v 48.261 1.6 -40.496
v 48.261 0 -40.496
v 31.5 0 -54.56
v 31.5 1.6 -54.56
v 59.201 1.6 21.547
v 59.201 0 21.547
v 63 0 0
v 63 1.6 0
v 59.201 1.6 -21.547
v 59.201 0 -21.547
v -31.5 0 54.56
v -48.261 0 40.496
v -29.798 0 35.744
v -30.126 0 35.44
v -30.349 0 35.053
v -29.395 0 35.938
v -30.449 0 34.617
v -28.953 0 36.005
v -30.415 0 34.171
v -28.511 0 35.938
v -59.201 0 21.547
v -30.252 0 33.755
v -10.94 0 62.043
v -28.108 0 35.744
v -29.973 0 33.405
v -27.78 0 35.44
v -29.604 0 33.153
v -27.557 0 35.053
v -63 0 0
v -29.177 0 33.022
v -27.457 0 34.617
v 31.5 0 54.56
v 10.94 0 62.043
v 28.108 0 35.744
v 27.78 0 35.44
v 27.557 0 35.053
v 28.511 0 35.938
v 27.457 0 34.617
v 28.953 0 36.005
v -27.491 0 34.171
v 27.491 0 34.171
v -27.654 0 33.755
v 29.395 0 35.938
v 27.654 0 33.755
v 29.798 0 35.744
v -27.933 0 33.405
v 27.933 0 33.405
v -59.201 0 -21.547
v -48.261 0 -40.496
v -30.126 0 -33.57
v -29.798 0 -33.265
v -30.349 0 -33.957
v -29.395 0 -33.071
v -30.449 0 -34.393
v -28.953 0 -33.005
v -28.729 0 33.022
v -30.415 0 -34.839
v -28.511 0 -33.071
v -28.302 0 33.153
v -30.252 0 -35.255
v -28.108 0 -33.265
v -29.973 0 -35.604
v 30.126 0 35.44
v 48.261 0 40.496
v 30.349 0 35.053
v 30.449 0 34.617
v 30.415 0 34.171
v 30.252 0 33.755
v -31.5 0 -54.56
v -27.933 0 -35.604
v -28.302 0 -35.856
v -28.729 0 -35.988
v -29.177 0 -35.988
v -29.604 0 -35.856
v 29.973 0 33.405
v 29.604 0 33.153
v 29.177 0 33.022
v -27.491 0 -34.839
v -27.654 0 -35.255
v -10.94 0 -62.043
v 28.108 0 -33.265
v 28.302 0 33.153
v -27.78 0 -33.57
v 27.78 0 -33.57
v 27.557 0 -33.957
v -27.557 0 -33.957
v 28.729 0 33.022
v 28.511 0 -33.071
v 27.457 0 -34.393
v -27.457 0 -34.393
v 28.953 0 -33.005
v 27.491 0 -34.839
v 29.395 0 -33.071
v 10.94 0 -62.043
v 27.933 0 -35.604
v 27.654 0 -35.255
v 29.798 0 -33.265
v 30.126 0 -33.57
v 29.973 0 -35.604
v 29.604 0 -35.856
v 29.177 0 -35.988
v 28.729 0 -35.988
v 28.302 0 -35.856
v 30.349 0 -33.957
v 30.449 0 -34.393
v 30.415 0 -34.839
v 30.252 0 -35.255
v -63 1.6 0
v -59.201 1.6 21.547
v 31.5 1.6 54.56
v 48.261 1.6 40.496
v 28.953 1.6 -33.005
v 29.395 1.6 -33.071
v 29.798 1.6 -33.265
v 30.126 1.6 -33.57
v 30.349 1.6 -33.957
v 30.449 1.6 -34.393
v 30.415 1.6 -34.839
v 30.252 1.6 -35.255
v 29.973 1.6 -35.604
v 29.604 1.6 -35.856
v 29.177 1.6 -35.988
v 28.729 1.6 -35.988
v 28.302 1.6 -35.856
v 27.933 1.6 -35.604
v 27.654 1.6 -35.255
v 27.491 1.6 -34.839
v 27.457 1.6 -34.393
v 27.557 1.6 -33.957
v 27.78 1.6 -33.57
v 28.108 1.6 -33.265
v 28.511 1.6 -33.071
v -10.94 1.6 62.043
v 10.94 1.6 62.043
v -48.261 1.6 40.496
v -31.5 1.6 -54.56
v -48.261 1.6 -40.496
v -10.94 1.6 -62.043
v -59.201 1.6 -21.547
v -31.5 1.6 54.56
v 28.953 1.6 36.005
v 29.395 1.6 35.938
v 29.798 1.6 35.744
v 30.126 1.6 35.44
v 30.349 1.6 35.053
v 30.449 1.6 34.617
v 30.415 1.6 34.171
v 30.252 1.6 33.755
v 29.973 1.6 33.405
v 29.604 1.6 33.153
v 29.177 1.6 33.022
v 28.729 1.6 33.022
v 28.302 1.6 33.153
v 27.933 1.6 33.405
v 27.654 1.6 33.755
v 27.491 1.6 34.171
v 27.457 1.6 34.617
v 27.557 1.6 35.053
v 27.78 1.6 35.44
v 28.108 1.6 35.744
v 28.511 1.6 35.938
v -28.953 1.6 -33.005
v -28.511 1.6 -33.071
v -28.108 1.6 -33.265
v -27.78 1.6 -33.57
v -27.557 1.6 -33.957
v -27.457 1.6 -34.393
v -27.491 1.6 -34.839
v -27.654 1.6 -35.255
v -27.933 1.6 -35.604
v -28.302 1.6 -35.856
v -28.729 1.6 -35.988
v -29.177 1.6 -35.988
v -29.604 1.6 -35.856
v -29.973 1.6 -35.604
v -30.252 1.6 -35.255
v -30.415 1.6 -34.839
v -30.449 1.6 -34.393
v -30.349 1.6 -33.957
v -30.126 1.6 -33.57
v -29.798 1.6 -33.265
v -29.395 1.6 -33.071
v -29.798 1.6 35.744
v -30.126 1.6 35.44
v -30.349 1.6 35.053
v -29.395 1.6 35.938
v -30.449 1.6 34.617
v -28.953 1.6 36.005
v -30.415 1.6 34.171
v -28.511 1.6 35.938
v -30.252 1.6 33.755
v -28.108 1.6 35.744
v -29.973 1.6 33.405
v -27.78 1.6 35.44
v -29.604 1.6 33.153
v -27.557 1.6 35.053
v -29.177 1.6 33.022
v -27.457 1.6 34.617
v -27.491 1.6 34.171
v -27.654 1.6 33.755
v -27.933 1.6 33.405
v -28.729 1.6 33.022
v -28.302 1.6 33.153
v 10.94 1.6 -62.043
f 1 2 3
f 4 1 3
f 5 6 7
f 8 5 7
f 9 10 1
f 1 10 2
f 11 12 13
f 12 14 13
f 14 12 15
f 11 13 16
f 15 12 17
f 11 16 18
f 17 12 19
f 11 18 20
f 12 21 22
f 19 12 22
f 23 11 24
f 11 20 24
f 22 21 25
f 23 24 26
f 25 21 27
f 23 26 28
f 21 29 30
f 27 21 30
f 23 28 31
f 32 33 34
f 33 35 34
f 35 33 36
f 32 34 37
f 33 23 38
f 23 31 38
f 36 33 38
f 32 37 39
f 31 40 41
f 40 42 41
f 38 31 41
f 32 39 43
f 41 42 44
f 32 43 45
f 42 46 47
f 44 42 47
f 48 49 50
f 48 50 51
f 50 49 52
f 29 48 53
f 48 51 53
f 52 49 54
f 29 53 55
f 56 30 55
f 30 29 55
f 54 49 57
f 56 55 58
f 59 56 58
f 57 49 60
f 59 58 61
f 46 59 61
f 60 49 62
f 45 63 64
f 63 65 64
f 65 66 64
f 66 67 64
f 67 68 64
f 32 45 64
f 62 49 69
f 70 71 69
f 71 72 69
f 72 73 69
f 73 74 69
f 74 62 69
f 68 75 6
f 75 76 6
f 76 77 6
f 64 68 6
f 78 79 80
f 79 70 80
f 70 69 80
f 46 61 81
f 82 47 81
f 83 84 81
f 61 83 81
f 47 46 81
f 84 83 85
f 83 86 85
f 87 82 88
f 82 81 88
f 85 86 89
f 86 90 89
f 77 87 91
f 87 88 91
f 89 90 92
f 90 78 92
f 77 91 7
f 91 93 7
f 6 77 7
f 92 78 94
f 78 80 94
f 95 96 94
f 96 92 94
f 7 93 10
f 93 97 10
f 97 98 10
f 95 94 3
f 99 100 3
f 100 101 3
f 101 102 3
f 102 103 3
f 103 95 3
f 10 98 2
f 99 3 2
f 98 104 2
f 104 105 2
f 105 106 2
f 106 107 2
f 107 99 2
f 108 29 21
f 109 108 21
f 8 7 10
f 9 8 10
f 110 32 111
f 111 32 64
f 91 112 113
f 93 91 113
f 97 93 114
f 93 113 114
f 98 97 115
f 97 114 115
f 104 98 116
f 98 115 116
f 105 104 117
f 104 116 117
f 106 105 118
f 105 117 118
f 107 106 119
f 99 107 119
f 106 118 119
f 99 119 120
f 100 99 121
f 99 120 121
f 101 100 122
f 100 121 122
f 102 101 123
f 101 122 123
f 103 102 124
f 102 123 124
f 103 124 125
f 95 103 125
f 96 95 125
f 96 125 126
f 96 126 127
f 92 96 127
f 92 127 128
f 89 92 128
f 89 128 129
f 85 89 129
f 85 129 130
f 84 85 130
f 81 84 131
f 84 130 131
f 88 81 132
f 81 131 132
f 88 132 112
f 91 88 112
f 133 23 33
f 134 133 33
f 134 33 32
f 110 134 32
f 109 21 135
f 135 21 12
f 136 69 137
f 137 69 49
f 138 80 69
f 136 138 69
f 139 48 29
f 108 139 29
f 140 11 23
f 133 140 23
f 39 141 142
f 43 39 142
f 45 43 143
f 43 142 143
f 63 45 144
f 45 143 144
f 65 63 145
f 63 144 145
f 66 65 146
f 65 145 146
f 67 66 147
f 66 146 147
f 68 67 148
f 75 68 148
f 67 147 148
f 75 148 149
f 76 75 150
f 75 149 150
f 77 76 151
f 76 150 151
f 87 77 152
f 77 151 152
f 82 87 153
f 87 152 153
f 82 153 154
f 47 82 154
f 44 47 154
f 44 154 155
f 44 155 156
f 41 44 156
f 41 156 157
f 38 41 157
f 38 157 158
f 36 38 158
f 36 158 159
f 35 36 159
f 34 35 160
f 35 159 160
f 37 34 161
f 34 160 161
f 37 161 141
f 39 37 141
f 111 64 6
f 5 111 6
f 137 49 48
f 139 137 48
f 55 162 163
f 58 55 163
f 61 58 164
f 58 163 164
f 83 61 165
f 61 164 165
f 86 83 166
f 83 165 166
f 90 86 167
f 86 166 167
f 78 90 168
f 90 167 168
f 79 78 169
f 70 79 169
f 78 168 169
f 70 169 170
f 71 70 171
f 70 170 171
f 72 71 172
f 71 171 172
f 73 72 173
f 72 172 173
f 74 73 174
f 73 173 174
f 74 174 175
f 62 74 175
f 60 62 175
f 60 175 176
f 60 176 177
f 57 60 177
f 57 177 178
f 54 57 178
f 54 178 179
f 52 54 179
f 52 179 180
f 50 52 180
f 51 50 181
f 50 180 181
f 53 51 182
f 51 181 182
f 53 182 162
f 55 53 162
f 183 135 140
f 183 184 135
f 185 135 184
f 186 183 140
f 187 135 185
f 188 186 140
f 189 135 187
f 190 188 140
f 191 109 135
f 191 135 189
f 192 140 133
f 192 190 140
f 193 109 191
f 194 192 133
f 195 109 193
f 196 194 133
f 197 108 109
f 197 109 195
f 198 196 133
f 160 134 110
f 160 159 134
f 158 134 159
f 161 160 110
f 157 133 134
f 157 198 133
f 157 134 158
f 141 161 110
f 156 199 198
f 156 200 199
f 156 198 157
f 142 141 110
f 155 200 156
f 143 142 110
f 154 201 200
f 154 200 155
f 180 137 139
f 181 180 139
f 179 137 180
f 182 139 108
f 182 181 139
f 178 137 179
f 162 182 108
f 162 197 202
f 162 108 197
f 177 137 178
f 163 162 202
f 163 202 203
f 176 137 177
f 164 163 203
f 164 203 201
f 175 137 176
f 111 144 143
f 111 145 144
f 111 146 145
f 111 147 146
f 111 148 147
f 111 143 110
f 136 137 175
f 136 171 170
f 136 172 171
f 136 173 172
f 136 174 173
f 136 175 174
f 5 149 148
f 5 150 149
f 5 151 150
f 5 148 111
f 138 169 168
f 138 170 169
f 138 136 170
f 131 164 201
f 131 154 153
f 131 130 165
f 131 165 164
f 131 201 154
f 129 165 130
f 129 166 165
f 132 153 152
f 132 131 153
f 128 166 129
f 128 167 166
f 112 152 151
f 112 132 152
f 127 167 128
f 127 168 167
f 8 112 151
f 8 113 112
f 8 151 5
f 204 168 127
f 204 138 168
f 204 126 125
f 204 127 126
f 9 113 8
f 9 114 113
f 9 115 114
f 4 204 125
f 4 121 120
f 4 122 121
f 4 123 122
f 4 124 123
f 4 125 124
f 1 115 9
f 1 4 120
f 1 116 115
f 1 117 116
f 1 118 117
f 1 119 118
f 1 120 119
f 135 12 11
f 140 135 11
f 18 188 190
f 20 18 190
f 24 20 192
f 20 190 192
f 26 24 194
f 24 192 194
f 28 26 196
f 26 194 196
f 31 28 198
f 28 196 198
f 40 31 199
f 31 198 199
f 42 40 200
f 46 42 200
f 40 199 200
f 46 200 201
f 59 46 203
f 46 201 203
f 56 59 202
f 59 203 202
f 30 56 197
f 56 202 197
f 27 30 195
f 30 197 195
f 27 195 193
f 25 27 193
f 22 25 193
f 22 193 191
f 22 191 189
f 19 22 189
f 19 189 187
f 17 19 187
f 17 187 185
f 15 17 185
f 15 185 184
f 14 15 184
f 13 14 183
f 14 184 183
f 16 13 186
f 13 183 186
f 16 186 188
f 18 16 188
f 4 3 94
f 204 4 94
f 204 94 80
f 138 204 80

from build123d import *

# Parameters (mm, degrees)
BOSS_EXTRUDE1_DEPTH = 1.6
SKETCH7_R           = 1.5
CUT_EXTRUDE4_DEPTH  = 1.6


with BuildPart() as part:
    # Sketch1 → Boss-Extrude1 (new body)
    with BuildSketch(Plane(origin=(0, 0, 0), x_dir=(1, 0, 0), z_dir=(0, 1, 0))):
        Polygon((63, 0), (59.20063511, 21.54726903), (48.260799916, 40.49561941), (31.5, 54.559600438), (10.939835193, 62.04288844), (-10.939835193, 62.04288844), (-31.5, 54.559600438), (-48.260799916, 40.49561941), (-59.20063511, 21.54726903), (-63, 0), (-59.20063511, -21.54726903), (-48.260799916, -40.49561941), (-31.5, -54.559600438), (-10.939835193, -62.04288844), (10.939835193, -62.04288844), (31.5, -54.559600438), (48.260799916, -40.49561941), (59.20063511, -21.54726903), align=None)
    extrude(amount=BOSS_EXTRUDE1_DEPTH)

    # Sketch7 → Cut-Extrude4 (cut)
    with BuildSketch(Plane(origin=(0, 1.6, 0), x_dir=(1, 0, 0), z_dir=(0, 1, 0))):
        with Locations(Location((-28.953010594, 34.504854391, 0), (0, 0, 270))):
            Circle(SKETCH7_R)
        with Locations(Location((28.953010594, 34.504854391, 0), (0, 0, 270))):
            Circle(SKETCH7_R)
        with Locations(Location((-28.953010594, -34.504854391, 0), (0, 0, 270))):
            Circle(SKETCH7_R)
        with Locations(Location((28.953010594, -34.504854391, 0), (0, 0, 270))):
            Circle(SKETCH7_R)
    extrude(amount=-CUT_EXTRUDE4_DEPTH, mode=Mode.SUBTRACT)


solid = part.part
